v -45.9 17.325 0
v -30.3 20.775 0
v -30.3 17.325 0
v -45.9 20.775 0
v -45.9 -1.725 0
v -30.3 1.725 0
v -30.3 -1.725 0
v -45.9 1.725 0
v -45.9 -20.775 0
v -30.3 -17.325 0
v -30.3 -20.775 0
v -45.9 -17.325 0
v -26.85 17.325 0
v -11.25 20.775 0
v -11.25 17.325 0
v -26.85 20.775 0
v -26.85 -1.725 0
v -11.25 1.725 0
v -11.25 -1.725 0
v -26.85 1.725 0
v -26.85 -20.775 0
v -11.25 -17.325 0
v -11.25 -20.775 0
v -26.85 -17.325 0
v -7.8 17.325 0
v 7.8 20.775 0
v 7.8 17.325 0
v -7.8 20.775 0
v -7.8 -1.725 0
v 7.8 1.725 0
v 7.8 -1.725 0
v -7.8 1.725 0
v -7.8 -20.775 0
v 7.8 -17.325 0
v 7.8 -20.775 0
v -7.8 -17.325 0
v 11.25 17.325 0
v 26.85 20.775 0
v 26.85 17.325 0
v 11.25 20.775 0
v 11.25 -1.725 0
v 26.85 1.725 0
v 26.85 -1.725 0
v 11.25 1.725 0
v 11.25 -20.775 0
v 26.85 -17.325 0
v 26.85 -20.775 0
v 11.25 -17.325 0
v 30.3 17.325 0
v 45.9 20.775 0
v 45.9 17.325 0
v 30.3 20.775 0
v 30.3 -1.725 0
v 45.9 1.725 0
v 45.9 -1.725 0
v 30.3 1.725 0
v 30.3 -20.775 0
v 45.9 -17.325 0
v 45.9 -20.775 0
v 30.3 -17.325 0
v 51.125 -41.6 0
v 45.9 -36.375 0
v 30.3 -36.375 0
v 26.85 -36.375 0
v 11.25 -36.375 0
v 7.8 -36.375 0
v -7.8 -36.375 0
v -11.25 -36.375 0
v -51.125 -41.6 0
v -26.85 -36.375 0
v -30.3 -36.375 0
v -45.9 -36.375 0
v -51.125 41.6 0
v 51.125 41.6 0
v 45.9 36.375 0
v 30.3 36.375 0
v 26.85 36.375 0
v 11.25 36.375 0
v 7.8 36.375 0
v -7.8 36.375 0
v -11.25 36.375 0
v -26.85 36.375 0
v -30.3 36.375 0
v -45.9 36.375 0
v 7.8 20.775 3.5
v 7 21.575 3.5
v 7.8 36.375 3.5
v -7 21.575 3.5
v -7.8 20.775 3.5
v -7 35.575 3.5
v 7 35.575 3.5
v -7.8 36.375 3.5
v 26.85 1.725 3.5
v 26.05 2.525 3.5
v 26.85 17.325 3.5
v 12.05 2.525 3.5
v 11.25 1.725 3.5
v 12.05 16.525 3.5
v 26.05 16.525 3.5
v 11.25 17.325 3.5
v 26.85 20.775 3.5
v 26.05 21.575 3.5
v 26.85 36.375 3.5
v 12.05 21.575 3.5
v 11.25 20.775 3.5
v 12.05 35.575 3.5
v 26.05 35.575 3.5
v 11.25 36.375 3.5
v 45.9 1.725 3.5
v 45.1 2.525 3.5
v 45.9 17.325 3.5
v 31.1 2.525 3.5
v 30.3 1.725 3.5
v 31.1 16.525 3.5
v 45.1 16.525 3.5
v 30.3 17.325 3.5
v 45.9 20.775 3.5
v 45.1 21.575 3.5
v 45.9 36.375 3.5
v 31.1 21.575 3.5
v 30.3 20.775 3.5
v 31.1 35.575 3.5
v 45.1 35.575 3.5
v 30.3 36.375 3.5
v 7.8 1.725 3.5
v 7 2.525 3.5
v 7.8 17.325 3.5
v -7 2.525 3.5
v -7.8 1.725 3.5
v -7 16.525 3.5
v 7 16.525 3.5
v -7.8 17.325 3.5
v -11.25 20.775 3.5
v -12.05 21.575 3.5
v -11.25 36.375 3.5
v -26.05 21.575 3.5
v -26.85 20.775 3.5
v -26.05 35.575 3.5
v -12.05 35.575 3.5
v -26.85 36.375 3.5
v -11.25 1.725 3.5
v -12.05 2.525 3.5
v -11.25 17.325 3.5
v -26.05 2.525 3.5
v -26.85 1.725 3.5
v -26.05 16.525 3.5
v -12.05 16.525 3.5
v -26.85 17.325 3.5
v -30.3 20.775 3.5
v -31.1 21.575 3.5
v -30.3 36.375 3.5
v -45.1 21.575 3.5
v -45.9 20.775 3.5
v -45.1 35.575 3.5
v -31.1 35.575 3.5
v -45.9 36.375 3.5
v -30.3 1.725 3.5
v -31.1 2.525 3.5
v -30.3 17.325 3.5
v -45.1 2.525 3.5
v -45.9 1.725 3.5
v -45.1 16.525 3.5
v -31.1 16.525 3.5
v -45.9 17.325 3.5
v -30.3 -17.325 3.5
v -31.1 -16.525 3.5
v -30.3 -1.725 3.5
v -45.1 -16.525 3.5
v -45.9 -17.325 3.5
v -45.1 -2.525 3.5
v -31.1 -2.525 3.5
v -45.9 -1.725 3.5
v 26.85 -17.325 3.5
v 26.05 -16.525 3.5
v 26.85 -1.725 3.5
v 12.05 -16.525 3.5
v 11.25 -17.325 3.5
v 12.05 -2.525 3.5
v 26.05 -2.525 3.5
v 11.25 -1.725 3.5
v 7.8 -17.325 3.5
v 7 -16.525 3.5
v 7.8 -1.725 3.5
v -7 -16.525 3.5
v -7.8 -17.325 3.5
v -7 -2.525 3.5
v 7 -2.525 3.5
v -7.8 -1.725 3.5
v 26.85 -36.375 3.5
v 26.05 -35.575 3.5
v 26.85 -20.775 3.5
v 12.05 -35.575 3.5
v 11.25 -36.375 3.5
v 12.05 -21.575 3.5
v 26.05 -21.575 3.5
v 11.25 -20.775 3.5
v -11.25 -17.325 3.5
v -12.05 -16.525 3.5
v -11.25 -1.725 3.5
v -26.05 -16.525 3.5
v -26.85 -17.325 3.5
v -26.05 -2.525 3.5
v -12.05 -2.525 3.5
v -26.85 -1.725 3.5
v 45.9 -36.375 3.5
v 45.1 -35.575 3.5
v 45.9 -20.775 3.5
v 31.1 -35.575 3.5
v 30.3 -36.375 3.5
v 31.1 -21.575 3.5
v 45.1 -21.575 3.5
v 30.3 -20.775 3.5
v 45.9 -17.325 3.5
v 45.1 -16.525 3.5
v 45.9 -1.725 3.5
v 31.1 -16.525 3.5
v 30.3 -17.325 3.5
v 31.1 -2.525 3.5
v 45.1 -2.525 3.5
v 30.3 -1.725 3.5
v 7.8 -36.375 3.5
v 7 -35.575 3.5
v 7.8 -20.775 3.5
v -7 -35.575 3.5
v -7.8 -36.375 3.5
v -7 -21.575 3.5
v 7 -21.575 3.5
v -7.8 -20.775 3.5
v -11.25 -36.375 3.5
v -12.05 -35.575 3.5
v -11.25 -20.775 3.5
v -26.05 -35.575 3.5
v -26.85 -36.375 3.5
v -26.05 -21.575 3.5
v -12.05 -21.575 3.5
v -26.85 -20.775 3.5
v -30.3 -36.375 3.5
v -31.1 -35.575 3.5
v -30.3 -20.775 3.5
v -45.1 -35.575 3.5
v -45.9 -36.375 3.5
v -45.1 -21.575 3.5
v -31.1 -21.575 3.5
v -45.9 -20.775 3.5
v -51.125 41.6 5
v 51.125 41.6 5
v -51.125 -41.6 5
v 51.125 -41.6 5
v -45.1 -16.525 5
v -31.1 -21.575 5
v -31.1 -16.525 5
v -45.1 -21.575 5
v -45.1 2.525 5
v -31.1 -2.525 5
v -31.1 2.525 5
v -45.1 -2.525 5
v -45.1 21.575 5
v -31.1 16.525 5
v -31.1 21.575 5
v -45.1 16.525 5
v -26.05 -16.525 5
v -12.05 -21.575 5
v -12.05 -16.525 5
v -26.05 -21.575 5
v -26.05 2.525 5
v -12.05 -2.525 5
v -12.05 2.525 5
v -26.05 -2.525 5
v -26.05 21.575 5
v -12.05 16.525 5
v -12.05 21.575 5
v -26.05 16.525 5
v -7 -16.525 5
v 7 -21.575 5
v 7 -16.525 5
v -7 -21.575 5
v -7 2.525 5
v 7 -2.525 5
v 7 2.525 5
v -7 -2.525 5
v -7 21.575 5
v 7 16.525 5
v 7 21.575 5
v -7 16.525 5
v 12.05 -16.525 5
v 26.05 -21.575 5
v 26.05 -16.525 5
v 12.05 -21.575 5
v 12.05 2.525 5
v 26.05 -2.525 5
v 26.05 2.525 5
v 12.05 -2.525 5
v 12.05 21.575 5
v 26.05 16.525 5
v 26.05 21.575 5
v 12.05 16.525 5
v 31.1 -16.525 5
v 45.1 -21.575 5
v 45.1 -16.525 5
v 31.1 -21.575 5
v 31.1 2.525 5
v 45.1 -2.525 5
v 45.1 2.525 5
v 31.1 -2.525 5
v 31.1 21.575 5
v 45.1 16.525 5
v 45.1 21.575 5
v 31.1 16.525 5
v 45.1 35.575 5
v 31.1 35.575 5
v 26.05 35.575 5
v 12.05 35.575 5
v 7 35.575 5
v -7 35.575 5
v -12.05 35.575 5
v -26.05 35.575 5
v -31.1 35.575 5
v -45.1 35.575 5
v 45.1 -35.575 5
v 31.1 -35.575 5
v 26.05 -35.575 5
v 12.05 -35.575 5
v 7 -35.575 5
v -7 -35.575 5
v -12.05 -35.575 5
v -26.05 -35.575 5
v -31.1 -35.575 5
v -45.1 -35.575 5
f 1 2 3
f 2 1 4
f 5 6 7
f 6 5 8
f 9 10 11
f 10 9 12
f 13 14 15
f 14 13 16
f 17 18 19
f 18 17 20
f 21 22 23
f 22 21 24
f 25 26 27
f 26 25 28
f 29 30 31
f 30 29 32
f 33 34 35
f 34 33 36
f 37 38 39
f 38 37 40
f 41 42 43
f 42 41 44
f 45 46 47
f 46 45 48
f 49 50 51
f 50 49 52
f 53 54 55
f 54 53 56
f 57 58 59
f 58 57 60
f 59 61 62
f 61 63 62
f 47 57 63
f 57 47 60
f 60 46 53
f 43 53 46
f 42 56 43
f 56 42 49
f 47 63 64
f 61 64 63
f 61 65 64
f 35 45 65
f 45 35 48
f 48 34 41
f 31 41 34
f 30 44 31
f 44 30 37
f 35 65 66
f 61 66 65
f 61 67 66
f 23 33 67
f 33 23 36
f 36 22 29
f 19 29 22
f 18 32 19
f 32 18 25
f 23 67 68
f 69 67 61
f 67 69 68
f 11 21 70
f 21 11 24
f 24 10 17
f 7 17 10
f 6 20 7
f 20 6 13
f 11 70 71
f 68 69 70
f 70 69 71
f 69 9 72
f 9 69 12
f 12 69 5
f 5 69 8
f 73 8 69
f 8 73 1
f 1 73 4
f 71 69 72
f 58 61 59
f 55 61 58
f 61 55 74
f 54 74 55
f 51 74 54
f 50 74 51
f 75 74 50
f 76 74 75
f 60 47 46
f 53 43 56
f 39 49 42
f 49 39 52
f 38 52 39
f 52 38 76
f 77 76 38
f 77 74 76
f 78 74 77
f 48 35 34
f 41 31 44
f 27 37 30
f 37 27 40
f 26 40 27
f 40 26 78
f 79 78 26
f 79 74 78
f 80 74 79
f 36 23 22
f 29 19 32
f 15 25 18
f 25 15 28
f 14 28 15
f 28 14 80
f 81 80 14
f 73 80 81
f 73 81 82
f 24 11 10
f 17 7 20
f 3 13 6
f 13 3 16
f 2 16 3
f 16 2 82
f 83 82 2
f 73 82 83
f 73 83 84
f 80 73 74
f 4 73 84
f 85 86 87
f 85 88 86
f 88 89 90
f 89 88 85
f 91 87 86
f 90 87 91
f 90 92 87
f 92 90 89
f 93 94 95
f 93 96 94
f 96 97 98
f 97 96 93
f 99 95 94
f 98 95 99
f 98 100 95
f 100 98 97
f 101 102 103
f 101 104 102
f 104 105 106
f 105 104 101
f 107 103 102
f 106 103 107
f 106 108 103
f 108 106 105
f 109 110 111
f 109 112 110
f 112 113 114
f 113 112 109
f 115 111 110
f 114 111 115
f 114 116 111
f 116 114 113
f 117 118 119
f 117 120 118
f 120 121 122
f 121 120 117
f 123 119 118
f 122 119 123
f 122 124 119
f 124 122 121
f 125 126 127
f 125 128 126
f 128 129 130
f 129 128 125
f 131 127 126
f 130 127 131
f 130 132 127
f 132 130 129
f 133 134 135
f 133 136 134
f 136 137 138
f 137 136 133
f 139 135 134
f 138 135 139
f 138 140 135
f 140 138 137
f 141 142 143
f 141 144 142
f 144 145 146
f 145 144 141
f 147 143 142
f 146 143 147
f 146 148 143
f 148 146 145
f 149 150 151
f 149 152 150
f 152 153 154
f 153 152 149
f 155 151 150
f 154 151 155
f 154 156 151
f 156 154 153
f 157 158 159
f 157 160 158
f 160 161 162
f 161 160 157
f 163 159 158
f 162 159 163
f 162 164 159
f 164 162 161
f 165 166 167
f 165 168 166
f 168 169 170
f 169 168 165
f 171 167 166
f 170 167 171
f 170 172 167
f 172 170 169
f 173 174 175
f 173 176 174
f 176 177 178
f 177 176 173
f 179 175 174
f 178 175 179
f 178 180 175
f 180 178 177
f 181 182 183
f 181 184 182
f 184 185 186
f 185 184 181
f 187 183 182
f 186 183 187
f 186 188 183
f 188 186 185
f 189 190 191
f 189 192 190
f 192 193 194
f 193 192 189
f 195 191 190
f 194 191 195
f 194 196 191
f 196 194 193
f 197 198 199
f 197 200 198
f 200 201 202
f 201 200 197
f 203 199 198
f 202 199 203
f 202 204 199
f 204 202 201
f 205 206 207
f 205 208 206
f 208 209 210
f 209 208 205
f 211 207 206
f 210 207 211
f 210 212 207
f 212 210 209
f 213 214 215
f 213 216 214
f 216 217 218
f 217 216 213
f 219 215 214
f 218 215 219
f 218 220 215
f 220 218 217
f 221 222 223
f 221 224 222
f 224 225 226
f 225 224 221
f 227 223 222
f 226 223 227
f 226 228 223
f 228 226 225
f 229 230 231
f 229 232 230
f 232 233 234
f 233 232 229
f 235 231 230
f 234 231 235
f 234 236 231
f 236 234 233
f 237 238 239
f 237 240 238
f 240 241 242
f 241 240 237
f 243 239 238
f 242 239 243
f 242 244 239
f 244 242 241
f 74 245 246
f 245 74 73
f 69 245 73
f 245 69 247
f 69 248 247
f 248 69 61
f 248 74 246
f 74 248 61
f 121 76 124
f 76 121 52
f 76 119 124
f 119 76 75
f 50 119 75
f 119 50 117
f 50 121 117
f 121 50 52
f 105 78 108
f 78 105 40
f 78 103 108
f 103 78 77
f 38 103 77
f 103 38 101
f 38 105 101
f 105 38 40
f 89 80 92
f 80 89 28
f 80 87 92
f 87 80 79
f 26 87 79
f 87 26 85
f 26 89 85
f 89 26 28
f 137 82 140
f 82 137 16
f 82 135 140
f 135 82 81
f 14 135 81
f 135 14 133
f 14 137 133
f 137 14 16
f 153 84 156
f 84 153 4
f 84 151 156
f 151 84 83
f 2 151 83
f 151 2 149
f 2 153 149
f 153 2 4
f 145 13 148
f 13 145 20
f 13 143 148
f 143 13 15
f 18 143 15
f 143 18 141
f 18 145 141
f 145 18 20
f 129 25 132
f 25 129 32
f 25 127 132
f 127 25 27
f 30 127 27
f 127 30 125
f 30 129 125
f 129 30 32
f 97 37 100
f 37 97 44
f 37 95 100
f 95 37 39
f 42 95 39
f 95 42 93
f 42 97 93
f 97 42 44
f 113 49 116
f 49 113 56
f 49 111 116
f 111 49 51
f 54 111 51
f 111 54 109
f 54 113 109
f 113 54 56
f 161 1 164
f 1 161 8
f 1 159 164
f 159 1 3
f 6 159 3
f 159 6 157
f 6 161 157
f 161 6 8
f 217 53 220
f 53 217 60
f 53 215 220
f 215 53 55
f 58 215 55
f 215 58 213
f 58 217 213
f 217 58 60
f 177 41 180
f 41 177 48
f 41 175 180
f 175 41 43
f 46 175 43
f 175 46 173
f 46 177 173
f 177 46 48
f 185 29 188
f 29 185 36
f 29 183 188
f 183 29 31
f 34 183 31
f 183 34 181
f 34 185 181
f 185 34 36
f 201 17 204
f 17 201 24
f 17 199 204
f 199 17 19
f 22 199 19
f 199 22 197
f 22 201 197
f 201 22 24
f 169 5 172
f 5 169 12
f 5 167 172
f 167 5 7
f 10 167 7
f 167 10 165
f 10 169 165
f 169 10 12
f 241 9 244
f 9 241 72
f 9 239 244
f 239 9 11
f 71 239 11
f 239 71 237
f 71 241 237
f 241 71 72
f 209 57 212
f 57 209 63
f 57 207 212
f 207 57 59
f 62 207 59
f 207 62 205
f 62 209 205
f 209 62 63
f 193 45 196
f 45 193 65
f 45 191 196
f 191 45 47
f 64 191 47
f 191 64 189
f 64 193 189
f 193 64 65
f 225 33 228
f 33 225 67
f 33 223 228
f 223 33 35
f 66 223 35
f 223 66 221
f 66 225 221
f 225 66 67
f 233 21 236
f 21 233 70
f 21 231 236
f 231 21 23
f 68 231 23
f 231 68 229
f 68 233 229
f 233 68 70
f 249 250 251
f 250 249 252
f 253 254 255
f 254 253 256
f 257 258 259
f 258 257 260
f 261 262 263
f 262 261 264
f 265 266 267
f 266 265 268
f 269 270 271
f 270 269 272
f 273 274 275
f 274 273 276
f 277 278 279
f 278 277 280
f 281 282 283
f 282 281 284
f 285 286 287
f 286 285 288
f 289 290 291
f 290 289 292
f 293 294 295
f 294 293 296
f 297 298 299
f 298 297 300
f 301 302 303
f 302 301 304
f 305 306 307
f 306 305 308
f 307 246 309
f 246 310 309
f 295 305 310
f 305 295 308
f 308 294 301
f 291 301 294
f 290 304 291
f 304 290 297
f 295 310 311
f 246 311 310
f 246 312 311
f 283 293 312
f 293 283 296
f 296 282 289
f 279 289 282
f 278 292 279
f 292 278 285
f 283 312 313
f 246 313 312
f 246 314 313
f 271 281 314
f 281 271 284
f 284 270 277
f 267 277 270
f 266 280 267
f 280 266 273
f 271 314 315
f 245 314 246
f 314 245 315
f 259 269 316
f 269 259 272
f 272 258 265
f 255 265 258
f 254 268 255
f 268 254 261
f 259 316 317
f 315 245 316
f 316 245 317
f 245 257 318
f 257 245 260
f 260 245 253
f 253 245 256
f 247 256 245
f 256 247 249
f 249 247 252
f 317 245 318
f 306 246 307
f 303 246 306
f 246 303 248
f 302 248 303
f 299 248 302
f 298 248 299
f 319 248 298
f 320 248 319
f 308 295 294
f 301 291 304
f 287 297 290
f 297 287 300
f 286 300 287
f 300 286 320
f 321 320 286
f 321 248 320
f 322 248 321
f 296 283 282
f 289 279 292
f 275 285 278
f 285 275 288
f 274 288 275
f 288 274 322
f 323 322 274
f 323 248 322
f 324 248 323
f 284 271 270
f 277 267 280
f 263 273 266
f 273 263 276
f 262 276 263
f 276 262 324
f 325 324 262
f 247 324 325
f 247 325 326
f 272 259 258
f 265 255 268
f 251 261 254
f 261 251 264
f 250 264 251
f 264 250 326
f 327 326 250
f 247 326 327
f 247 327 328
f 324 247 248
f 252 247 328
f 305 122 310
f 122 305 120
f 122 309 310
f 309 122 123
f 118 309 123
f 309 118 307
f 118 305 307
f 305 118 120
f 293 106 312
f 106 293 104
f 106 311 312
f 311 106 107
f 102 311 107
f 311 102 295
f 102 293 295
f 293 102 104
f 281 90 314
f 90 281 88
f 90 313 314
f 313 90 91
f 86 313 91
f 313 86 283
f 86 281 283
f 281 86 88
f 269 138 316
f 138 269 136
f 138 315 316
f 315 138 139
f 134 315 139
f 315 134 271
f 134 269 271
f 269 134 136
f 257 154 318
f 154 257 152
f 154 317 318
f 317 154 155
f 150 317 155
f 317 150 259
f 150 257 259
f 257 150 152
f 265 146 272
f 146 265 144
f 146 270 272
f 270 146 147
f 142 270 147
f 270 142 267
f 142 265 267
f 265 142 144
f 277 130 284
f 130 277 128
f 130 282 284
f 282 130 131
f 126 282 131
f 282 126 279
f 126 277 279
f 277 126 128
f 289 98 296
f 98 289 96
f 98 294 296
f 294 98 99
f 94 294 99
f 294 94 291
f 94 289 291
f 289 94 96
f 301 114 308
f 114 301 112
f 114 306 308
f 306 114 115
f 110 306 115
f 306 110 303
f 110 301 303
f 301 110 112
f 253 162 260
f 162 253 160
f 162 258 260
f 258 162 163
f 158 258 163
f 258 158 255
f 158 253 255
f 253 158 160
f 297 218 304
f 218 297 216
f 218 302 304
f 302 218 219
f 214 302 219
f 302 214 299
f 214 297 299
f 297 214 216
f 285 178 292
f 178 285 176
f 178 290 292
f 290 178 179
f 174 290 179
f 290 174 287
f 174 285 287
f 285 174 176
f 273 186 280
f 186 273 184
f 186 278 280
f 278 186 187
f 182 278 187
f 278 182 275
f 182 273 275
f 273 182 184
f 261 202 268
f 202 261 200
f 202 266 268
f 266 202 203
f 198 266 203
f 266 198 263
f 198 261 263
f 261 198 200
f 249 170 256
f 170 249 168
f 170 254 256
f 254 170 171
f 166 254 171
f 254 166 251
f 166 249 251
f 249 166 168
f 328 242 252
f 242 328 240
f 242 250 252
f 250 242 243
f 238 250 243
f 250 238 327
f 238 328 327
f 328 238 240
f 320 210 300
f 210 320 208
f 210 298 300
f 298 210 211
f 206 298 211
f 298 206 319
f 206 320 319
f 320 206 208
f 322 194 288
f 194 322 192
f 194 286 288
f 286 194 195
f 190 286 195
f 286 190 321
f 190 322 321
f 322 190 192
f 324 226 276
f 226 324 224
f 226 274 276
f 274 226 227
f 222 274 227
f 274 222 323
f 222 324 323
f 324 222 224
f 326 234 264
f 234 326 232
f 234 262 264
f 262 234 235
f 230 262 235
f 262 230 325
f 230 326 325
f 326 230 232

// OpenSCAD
// these are set in the module definitions, but
// they can be included when calling the module
UNIT = 19.05;
SWITCH_SIZE = 14;

MX_TH = 1.5;	//	expected plate thickness (use large box below for 3d print
				//	and larger thickness defined below )
MX_LW = 15.6;   //	size of largest dimension of switch where it 
				//	contacts the plate

width = 4;		// dimensions in number of switches
length= 5;

thickness = 5;	// this is the total, including expected plate (see above)
border = 7;		// border in millimeters

// here we should use python to generate points from KLE info / cap sizes
points = [ for (k=[0:width-1]) for (l = [0:length-1]) concat(l,k)];

// distances for each hole in millimeters from origin
switch_loc = [ for (j = points) UNIT * j + 0.5 * UNIT * [1,1]];

// physical size of the plate print in millimeters
platesize = UNIT*[length,width] + border*[1,1];

// origin placed at low-left, in from the edge by 1/2 border
origin = -0.5*(platesize) + 0.5*border*[1,1];

module plate_proj(size,coords,start,sw_dim){    
	difference()
	{
		square(size,true);
		translate(start){		 // cutouts for switches
			for (i=coords)
				translate(i) 
					square(sw_dim,true);
		}
		
		// when implementing holes for stabs and fixation, put it here

	}	// end of holes in slab

}	

module plate(size,coords=[],start=[0,0],small=14,big = 15.6,th=5,lip=1.5){
	linear_extrude(th - lip) plate_proj(size,coords,start,big);
	translate([0,0,th-lip]) 
		linear_extrude(lip) plate_proj(size,coords,start,small);
}
plate(platesize,switch_loc,origin);
